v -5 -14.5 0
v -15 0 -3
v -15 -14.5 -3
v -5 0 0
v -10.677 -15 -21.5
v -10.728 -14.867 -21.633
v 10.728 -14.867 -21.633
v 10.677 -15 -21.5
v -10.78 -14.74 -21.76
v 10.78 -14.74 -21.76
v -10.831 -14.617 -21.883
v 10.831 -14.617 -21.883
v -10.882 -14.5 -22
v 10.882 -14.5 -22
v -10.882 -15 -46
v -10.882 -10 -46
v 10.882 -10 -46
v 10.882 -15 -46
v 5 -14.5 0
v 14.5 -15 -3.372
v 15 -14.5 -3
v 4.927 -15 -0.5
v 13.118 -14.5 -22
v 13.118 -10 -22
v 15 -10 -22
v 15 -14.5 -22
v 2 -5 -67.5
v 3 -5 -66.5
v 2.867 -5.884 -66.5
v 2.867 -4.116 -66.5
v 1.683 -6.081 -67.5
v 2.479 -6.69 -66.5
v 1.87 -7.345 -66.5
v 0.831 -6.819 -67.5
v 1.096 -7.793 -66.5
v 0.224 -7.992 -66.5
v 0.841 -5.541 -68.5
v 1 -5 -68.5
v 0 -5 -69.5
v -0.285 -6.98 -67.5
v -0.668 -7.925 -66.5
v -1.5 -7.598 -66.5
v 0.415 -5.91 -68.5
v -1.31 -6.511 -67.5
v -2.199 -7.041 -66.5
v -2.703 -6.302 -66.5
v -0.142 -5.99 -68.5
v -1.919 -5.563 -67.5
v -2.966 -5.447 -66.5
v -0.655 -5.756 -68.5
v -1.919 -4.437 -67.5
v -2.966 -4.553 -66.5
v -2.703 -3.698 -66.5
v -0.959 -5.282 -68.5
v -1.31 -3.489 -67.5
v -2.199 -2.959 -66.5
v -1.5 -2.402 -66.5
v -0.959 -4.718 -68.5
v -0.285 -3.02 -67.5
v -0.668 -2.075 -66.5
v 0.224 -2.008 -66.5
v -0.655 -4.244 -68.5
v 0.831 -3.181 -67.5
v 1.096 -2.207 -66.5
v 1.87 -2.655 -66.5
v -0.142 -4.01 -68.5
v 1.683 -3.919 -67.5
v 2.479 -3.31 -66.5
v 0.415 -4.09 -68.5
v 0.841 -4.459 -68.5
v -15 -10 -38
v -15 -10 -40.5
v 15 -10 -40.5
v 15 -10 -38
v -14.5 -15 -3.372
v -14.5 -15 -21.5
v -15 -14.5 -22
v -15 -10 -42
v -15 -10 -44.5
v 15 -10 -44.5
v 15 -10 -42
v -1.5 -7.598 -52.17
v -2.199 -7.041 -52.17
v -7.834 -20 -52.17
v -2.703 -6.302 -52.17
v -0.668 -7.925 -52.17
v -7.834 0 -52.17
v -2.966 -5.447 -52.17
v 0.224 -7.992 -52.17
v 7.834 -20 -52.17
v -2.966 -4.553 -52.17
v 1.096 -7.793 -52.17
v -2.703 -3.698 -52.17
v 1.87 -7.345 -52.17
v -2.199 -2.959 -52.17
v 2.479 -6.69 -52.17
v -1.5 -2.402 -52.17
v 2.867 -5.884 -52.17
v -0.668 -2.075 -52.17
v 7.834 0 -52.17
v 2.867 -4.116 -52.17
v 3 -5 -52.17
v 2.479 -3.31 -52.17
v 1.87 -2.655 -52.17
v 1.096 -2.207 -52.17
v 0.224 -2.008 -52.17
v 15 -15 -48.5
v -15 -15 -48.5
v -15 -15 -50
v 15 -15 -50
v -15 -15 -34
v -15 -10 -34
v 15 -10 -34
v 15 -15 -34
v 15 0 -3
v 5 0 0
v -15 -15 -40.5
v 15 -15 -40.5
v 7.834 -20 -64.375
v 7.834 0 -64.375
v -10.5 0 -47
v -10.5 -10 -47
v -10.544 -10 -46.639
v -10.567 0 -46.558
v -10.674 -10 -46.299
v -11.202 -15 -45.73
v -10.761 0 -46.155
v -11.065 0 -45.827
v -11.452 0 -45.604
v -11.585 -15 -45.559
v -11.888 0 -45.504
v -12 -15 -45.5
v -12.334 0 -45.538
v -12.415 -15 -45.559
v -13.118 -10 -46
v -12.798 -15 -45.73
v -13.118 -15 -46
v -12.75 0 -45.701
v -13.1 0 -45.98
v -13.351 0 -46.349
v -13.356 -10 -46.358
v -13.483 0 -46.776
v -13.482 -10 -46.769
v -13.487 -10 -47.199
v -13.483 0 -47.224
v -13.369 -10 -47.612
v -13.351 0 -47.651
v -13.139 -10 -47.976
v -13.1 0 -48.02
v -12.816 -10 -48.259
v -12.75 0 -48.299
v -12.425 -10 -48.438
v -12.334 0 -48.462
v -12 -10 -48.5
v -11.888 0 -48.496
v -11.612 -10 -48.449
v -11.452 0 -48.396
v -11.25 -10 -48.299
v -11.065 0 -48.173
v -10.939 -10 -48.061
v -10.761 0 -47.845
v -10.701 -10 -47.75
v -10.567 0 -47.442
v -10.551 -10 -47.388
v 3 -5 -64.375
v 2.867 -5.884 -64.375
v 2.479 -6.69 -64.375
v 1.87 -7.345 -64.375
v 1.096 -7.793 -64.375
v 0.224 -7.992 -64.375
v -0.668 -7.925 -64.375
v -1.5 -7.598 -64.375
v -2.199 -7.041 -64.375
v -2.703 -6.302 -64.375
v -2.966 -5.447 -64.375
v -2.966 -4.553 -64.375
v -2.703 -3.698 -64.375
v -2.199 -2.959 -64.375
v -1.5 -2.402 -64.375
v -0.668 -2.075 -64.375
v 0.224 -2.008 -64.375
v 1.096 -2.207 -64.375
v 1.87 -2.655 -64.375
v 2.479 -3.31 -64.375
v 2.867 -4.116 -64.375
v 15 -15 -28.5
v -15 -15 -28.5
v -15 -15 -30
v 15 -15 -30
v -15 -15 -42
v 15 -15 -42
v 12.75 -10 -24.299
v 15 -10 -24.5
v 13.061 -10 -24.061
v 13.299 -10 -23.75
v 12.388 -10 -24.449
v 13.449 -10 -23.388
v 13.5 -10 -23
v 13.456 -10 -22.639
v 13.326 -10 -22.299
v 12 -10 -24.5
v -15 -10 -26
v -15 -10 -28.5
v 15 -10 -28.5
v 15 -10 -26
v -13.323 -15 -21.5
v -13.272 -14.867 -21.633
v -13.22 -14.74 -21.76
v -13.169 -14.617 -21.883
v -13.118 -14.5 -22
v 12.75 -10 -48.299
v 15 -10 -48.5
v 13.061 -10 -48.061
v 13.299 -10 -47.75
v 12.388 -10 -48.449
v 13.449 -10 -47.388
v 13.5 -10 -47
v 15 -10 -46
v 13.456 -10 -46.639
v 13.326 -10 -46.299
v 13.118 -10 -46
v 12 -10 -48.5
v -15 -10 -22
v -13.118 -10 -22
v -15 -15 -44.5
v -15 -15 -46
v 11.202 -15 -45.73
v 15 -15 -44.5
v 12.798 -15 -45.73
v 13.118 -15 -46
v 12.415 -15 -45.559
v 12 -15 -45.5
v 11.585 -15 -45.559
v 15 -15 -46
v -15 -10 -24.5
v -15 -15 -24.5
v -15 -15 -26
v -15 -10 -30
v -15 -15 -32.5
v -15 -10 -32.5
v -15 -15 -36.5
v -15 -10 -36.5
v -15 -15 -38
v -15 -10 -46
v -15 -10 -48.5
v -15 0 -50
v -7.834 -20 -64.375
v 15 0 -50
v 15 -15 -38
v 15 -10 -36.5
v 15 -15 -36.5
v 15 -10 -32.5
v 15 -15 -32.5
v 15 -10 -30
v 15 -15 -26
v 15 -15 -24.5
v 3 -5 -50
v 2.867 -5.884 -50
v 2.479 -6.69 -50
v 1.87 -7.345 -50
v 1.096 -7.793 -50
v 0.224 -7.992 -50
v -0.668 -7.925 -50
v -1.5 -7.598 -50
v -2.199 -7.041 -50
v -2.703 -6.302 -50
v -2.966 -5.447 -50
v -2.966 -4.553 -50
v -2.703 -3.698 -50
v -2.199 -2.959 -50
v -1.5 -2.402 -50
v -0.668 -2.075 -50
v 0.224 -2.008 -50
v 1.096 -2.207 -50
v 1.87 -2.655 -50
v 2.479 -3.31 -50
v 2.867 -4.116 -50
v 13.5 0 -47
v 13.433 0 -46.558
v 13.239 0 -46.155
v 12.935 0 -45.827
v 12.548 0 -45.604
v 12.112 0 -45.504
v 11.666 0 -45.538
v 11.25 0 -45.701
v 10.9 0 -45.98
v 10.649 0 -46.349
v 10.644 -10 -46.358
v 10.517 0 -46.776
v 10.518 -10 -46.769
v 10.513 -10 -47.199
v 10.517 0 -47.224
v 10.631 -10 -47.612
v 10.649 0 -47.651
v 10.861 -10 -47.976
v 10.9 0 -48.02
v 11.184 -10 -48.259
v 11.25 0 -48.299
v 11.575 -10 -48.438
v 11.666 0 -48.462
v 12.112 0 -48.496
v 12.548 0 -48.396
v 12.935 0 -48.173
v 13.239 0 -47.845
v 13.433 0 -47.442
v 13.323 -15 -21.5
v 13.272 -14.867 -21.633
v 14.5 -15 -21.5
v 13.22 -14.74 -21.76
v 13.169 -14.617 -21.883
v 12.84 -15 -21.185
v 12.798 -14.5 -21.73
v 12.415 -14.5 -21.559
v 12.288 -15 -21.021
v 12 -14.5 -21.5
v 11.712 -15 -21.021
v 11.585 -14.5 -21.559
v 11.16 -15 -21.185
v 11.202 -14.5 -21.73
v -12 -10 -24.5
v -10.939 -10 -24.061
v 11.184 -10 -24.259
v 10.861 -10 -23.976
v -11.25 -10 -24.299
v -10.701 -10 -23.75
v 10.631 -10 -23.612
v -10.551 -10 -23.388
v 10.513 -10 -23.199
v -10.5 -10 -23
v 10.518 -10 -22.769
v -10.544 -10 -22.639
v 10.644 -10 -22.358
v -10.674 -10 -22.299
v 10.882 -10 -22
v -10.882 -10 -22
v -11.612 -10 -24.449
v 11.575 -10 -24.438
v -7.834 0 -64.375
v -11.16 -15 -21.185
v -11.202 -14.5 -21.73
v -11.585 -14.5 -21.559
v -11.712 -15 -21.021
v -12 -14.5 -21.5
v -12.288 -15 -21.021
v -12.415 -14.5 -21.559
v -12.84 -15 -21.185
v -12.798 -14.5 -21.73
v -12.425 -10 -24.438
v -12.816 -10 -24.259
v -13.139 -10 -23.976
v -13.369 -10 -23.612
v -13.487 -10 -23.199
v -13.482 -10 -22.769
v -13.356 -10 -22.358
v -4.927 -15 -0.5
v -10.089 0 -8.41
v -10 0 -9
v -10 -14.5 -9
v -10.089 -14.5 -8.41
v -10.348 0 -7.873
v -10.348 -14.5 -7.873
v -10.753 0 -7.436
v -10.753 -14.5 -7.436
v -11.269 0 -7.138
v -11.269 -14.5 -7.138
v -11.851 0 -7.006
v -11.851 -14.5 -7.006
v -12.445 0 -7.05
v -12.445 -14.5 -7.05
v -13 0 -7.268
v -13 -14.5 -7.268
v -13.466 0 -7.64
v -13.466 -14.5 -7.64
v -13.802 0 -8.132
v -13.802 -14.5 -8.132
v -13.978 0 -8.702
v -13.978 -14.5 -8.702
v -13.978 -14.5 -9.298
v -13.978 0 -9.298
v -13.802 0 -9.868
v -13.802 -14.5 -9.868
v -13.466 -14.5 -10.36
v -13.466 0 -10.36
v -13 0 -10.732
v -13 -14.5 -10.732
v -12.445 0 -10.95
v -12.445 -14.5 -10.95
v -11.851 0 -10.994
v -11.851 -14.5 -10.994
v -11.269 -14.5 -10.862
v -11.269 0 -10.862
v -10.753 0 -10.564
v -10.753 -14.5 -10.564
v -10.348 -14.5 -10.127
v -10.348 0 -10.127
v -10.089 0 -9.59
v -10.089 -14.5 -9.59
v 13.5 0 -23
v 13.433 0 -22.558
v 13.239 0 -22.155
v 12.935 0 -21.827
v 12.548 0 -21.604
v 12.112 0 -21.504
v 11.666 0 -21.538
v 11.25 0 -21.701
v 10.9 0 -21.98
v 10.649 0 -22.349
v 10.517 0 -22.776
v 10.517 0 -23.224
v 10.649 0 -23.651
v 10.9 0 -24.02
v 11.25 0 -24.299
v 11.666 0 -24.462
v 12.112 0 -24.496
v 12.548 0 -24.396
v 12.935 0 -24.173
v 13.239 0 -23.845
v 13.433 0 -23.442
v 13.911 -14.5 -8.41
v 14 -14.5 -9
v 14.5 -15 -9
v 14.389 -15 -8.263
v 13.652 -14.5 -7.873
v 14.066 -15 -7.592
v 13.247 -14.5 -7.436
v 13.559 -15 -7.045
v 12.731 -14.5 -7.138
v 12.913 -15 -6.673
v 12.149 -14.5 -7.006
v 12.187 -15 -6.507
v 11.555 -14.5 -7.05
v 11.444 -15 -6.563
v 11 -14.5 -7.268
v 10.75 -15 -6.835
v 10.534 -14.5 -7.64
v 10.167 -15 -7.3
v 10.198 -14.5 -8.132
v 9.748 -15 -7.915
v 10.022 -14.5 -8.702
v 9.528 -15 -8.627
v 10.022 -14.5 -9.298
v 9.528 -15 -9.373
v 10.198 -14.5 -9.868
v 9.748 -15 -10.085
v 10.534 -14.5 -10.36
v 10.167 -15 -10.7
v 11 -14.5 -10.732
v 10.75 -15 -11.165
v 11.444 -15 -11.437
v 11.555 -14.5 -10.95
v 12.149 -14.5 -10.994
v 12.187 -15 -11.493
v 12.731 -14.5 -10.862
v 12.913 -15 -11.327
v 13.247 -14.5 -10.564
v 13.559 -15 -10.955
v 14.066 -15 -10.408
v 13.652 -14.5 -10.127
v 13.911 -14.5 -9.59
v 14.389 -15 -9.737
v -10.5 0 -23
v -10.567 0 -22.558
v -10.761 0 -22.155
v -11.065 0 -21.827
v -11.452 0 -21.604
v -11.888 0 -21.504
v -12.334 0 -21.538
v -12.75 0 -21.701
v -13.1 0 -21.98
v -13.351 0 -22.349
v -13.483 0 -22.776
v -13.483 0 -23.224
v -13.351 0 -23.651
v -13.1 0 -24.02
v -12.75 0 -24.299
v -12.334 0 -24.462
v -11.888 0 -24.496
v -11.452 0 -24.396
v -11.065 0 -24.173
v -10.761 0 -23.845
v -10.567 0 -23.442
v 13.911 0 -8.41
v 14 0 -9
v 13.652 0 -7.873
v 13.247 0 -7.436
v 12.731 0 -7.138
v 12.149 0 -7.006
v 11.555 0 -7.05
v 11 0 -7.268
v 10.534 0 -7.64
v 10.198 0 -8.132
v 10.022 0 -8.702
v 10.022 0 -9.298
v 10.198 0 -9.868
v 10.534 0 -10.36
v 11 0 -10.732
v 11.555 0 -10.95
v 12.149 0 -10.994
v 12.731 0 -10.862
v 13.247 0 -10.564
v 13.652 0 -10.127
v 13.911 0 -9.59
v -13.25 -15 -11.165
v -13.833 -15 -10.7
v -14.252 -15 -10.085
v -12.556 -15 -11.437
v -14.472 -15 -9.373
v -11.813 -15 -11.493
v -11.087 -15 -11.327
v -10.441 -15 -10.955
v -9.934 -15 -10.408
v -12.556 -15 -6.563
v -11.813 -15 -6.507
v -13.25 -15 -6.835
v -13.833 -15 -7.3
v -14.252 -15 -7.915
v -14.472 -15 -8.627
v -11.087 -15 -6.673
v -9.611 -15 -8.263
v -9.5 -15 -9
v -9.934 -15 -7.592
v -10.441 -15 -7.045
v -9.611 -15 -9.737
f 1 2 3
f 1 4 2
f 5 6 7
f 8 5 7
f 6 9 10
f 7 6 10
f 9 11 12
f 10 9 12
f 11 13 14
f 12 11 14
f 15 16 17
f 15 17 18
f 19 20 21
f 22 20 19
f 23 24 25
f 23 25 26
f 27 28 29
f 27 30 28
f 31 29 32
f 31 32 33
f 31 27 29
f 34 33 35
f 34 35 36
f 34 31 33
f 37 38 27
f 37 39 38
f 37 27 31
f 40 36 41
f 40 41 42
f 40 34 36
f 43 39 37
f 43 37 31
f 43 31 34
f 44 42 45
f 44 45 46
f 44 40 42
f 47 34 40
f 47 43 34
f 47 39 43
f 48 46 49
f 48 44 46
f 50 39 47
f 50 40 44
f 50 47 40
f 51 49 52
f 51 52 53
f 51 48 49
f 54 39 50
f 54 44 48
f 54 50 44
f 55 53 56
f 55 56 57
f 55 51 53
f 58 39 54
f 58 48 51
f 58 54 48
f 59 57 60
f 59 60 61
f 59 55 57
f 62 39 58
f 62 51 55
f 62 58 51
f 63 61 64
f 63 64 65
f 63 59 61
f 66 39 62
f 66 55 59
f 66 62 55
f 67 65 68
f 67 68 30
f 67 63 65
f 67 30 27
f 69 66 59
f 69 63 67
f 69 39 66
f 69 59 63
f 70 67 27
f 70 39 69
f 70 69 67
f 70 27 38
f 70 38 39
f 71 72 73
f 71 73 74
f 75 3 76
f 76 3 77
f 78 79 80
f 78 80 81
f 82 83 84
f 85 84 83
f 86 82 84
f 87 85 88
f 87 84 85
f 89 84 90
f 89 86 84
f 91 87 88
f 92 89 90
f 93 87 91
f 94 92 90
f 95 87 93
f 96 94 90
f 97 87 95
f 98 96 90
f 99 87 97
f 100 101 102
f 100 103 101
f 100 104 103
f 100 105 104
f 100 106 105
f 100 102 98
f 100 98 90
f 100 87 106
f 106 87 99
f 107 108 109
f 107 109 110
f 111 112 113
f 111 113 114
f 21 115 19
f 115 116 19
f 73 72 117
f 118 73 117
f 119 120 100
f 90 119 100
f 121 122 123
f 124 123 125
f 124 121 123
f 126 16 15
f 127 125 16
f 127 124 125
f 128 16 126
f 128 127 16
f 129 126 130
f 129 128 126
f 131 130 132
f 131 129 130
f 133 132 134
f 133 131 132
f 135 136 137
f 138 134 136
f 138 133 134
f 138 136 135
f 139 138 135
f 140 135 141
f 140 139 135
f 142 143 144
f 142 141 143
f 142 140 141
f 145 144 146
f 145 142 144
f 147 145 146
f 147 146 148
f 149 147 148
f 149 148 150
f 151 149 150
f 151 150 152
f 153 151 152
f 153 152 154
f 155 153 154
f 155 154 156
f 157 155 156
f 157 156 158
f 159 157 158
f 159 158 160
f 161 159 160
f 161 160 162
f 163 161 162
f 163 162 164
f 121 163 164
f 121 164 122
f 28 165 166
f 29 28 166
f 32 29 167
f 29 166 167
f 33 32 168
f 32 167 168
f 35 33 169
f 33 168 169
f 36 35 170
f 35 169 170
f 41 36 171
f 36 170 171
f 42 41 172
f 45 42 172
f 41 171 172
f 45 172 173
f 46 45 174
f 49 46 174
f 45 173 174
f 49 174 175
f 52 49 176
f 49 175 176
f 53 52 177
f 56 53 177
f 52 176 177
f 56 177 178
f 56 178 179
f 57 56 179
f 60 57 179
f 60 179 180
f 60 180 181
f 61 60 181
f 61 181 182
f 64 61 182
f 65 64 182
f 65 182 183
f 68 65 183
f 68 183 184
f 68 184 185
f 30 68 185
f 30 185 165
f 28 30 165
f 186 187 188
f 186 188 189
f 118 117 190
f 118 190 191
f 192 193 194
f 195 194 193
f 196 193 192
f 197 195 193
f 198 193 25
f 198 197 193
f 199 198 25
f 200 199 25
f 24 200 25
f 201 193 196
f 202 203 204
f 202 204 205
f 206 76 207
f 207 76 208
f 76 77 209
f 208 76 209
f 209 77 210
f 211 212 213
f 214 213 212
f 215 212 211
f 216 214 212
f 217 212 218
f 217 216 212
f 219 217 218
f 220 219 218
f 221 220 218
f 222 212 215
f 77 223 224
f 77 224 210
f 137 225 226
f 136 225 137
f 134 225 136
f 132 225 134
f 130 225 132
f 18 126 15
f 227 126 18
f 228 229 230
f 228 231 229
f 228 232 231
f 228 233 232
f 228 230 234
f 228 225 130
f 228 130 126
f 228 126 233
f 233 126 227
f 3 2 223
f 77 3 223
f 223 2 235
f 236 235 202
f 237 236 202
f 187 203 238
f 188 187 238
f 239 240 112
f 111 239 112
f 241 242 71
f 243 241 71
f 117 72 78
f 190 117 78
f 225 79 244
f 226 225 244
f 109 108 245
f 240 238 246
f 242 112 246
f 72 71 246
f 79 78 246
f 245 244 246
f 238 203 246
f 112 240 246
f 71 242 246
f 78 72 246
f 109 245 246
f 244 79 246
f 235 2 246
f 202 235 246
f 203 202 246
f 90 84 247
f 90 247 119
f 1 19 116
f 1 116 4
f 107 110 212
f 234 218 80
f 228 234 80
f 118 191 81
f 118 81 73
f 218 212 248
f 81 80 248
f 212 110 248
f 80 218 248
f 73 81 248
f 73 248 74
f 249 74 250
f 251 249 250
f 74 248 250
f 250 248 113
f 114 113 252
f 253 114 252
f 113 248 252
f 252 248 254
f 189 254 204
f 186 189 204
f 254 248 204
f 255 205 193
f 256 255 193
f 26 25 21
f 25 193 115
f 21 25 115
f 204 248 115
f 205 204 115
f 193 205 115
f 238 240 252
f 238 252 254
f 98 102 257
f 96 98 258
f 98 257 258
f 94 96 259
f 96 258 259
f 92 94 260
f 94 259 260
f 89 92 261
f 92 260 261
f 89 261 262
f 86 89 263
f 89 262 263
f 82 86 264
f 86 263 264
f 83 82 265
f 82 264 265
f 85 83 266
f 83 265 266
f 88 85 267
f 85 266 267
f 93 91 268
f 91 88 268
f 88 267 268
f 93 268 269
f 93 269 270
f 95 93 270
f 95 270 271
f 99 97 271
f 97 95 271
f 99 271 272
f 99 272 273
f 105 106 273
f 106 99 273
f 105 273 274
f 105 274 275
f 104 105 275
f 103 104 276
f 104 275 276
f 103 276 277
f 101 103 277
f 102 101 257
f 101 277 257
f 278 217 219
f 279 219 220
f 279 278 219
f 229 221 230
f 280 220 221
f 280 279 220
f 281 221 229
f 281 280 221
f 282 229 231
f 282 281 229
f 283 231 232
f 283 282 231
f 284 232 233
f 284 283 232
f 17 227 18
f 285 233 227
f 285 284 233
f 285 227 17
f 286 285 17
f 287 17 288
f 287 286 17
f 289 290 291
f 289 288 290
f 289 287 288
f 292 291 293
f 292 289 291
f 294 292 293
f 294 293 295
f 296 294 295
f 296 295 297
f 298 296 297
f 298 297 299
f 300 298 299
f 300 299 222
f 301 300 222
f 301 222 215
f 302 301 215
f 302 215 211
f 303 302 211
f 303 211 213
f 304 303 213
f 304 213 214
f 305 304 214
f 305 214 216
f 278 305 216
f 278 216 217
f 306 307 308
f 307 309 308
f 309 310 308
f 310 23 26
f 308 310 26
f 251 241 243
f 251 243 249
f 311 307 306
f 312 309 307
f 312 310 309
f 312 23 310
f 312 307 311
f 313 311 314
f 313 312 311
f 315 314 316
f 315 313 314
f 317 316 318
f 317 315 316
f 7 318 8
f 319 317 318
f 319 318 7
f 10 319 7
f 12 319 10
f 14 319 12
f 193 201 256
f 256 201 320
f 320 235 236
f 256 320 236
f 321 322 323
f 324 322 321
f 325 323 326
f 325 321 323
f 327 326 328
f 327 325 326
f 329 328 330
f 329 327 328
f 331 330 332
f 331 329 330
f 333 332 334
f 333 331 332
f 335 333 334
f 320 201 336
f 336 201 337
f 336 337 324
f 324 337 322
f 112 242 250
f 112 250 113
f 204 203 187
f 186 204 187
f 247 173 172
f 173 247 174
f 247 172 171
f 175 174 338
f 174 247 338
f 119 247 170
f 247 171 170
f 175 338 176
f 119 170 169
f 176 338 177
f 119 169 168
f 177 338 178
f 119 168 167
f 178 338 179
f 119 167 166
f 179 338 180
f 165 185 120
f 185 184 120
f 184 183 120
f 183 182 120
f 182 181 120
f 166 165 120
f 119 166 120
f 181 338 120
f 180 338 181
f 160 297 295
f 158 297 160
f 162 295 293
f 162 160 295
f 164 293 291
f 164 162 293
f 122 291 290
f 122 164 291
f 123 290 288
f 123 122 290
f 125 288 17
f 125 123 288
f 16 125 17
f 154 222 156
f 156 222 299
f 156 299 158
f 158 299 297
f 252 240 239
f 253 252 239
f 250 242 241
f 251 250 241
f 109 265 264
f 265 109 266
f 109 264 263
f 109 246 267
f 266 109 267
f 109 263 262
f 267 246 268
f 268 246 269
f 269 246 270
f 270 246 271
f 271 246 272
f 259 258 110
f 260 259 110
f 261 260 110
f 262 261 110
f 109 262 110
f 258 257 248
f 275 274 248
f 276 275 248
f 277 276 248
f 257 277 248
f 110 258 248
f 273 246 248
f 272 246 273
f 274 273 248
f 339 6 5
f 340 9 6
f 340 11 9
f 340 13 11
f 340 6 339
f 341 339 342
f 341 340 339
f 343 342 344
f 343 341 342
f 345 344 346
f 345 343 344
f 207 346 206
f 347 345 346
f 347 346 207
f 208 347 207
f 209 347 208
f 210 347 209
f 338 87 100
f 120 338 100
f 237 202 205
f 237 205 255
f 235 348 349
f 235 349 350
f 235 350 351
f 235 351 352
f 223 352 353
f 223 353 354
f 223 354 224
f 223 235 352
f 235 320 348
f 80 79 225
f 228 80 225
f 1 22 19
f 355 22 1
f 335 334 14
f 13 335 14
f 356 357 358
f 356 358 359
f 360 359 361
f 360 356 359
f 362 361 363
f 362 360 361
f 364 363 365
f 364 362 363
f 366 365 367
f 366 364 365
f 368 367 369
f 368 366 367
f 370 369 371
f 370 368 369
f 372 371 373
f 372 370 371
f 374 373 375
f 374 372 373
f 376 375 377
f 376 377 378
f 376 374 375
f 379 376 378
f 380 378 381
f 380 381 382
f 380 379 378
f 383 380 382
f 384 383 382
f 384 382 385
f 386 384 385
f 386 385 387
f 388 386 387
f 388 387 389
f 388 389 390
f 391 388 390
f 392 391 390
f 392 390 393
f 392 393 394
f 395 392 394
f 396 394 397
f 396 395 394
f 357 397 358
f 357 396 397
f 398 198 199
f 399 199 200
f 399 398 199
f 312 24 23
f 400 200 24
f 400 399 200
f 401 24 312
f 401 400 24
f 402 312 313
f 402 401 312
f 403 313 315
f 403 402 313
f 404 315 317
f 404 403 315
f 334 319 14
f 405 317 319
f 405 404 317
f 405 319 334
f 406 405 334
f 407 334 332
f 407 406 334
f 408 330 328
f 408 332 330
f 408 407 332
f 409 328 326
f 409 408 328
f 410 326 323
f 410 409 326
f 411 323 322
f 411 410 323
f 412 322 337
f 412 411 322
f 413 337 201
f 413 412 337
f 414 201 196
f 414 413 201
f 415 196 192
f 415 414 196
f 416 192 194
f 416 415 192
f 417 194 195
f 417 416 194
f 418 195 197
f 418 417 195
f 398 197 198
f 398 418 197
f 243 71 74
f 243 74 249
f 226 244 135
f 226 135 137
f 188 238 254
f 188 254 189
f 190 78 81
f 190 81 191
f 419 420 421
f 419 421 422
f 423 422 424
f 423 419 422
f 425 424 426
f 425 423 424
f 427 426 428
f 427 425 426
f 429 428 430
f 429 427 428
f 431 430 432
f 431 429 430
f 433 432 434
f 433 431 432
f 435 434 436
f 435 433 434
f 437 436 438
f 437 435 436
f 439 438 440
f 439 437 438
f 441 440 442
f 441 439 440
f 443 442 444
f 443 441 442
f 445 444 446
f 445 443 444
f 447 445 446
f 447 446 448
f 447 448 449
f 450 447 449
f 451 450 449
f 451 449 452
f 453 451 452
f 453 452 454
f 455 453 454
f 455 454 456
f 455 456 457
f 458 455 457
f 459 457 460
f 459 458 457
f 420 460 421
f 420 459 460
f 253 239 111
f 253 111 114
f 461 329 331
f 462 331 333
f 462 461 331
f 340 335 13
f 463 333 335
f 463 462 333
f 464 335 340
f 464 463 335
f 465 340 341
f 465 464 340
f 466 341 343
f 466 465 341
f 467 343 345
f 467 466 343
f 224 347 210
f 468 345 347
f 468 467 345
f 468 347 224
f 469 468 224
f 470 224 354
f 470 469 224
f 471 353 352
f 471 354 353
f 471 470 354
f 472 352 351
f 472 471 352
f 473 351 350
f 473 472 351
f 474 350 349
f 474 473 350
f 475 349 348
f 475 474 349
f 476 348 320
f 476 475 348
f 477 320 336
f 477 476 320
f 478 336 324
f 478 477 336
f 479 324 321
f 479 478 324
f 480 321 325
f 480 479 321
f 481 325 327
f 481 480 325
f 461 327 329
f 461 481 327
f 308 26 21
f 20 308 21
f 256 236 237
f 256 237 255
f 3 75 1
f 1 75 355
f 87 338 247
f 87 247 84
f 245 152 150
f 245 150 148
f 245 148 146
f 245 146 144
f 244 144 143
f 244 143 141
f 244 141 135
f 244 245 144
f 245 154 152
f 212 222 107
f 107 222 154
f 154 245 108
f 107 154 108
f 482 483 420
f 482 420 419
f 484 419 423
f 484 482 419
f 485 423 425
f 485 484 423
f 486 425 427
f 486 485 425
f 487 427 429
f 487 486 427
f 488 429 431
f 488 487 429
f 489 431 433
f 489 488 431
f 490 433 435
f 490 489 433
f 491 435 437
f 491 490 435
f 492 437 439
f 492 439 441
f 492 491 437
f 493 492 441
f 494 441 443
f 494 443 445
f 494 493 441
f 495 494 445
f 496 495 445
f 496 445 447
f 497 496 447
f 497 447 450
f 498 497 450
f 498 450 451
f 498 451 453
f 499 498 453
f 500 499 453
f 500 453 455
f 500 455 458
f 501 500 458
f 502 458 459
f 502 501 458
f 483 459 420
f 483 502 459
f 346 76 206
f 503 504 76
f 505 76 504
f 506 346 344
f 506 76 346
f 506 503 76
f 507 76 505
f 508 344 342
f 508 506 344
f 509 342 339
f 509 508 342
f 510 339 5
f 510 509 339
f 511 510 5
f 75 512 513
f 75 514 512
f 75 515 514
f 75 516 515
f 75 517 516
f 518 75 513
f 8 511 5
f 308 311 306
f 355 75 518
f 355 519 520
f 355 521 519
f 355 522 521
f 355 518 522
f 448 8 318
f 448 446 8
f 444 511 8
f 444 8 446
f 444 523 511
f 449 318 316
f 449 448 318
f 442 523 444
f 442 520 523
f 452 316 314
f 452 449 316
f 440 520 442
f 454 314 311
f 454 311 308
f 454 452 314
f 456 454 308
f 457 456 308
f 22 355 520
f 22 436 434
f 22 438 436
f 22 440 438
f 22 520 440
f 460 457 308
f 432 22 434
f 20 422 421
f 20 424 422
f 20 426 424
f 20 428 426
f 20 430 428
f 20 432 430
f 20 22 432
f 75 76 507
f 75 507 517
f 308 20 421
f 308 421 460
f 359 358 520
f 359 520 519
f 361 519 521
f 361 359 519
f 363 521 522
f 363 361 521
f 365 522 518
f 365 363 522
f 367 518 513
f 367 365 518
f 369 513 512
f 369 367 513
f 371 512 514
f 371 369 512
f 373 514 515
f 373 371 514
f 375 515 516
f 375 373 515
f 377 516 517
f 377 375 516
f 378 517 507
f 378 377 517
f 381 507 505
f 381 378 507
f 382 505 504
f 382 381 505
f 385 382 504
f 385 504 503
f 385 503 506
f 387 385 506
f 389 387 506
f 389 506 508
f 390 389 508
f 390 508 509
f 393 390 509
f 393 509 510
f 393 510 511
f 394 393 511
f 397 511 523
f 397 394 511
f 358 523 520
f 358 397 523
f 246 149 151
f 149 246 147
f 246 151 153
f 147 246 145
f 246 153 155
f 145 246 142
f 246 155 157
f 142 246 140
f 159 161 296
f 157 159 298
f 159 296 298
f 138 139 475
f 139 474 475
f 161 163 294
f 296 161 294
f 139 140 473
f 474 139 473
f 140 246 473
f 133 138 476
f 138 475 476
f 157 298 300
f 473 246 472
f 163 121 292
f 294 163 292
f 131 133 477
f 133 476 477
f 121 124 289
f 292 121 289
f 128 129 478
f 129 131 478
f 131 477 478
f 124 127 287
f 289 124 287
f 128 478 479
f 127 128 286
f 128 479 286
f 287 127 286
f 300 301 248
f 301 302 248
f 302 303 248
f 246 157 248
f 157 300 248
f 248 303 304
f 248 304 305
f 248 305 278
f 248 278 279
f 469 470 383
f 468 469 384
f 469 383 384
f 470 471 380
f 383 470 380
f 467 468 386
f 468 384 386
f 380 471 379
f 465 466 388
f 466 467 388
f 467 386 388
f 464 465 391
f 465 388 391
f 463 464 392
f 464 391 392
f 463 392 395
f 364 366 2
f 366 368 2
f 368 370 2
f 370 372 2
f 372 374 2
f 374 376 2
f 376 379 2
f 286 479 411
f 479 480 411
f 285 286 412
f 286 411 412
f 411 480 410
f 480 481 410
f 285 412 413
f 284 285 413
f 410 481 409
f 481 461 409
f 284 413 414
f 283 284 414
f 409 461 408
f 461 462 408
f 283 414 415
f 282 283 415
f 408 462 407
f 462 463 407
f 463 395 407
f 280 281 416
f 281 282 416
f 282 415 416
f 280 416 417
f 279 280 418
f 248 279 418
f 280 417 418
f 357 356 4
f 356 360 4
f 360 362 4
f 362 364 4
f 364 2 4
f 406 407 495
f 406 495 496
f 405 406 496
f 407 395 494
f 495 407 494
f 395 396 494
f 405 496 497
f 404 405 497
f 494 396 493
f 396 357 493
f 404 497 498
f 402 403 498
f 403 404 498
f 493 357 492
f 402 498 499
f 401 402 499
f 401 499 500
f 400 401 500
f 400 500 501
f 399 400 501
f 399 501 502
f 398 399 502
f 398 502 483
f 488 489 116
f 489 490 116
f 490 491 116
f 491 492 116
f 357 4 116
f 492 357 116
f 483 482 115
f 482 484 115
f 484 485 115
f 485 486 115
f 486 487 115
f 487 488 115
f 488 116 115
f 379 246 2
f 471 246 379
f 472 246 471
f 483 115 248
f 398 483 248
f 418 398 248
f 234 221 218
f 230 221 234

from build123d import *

# Parameters (mm, degrees)
F0_R       = 1.5
F0_R_2     = 2
F1_DEPTH   = 15
F2_W       = 5
F2_H       = 2.5
F3_DEPTH   = 30.001
F5_SIZE2   = 10
F5_SIZE    = 3
F5_2_SIZE2 = 10
F5_2_SIZE  = 3
F6_SIZE    = 0.49999
F4_R       = 3
F7_DEPTH   = 19.5
F8_SIZE    = 3
F9_W       = 15.6673565507
F9_H       = 12.20472157
F10_DEPTH  = 20


# Not quite as in the source:
# - a fillet or chamfer is up to 0.001 mm smaller than in the source, because OpenCascade refuses the exact size


with BuildPart() as f1:
    # F0 (on Front) → F1 (new body)
    with BuildSketch(Plane.XZ):
        Polygon((15, 0), (0, 0), (-15, 0), (-15, -50), (0, -50), (15, -50), align=None)
        with Locations((-12, -47)):
            Circle(F0_R, mode=Mode.SUBTRACT)
        with Locations((12, -47)):
            Circle(F0_R, mode=Mode.SUBTRACT)
        with Locations((-12, -23)):
            Circle(F0_R, mode=Mode.SUBTRACT)
        with Locations((-12, -9)):
            Circle(F0_R_2, mode=Mode.SUBTRACT)
        with Locations((12, -23)):
            Circle(F0_R, mode=Mode.SUBTRACT)
        with Locations((12, -9)):
            Circle(F0_R_2, mode=Mode.SUBTRACT)
    extrude(amount=F1_DEPTH)

    # F2 (on face) → F3 (cut, through all)
    with BuildSketch(Plane(origin=(-15, 0, 0), x_dir=(0, -1, 0), z_dir=(-1, 0, 0))):
        with Locations((12.5, -47.25)):
            Rectangle(F2_W, F2_H)
        with Locations((12.5, -43.25)):
            Rectangle(F2_W, F2_H)
        with Locations((12.5, -39.25)):
            Rectangle(F2_W, F2_H)
        with Locations((12.5, -35.25)):
            Rectangle(F2_W, F2_H)
        with Locations((12.5, -31.25)):
            Rectangle(F2_W, F2_H)
        with Locations((12.5, -27.25)):
            Rectangle(F2_W, F2_H)
        with Locations((12.5, -23.25)):
            Rectangle(F2_W, F2_H)
    extrude(amount=-F3_DEPTH, mode=Mode.SUBTRACT)

    # F5
    f5_edges = [f1.edges().sort_by_distance(p)[0] for p in [
        (-15, -7.5, 0),
    ]]
    f5_side = f1.faces().sort_by_distance((-15, -6.839623, -23.646226))[0]
    chamfer(f5_edges, length=F5_SIZE, length2=F5_SIZE2, reference=f5_side)

    # F5#2
    f5_2_edges = [f1.edges().sort_by_distance(p)[0] for p in [
        (15, -7.5, 0),
    ]]
    f5_2_side = f1.faces().sort_by_distance((15, -6.839623, -23.646226))[0]
    chamfer(f5_2_edges, length=F5_2_SIZE, length2=F5_2_SIZE2, reference=f5_2_side)

    # F6 (size 0.5 in the source; OpenCascade refuses exactly that, so slightly less here)
    f6_edges = [f1.edges().sort_by_distance(p)[0] for p in [
        (0, -15, 0),
        (10, -15, -1.5),
        (-10, -15, -1.5),
        (15, -15, -12.5),
        (-15, -15, -12.5),
        (14.059017, -15, -22),
        (-14.059017, -15, -22),
        (12, -15, -21.5),
        (-12, -15, -21.5),
        (0, -15, -22),
        (-14, -15, -9),
        (10, -15, -9),
    ]]
    chamfer(f6_edges, length=F6_SIZE)

    # F4 (on face) → F7 (join)
    with BuildSketch(Plane(origin=(0, 0, -50), x_dir=(1, 0, 0), z_dir=(0, 0, -1))):
        with Locations((0, 5)):
            Circle(F4_R)
    extrude(amount=F7_DEPTH)

    # F8
    f8_edges = [f1.edges().sort_by_distance(p)[0] for p in [
        (-3, -5, -69.5),
    ]]
    chamfer(f8_edges, length=F8_SIZE)

    # F9 (on Front) → F10 (join)
    with BuildSketch(Plane.XZ):
        with Locations((0, -58.2721680403)):
            Rectangle(F9_W, F9_H)
    extrude(amount=F10_DEPTH)


solid = f1.part
